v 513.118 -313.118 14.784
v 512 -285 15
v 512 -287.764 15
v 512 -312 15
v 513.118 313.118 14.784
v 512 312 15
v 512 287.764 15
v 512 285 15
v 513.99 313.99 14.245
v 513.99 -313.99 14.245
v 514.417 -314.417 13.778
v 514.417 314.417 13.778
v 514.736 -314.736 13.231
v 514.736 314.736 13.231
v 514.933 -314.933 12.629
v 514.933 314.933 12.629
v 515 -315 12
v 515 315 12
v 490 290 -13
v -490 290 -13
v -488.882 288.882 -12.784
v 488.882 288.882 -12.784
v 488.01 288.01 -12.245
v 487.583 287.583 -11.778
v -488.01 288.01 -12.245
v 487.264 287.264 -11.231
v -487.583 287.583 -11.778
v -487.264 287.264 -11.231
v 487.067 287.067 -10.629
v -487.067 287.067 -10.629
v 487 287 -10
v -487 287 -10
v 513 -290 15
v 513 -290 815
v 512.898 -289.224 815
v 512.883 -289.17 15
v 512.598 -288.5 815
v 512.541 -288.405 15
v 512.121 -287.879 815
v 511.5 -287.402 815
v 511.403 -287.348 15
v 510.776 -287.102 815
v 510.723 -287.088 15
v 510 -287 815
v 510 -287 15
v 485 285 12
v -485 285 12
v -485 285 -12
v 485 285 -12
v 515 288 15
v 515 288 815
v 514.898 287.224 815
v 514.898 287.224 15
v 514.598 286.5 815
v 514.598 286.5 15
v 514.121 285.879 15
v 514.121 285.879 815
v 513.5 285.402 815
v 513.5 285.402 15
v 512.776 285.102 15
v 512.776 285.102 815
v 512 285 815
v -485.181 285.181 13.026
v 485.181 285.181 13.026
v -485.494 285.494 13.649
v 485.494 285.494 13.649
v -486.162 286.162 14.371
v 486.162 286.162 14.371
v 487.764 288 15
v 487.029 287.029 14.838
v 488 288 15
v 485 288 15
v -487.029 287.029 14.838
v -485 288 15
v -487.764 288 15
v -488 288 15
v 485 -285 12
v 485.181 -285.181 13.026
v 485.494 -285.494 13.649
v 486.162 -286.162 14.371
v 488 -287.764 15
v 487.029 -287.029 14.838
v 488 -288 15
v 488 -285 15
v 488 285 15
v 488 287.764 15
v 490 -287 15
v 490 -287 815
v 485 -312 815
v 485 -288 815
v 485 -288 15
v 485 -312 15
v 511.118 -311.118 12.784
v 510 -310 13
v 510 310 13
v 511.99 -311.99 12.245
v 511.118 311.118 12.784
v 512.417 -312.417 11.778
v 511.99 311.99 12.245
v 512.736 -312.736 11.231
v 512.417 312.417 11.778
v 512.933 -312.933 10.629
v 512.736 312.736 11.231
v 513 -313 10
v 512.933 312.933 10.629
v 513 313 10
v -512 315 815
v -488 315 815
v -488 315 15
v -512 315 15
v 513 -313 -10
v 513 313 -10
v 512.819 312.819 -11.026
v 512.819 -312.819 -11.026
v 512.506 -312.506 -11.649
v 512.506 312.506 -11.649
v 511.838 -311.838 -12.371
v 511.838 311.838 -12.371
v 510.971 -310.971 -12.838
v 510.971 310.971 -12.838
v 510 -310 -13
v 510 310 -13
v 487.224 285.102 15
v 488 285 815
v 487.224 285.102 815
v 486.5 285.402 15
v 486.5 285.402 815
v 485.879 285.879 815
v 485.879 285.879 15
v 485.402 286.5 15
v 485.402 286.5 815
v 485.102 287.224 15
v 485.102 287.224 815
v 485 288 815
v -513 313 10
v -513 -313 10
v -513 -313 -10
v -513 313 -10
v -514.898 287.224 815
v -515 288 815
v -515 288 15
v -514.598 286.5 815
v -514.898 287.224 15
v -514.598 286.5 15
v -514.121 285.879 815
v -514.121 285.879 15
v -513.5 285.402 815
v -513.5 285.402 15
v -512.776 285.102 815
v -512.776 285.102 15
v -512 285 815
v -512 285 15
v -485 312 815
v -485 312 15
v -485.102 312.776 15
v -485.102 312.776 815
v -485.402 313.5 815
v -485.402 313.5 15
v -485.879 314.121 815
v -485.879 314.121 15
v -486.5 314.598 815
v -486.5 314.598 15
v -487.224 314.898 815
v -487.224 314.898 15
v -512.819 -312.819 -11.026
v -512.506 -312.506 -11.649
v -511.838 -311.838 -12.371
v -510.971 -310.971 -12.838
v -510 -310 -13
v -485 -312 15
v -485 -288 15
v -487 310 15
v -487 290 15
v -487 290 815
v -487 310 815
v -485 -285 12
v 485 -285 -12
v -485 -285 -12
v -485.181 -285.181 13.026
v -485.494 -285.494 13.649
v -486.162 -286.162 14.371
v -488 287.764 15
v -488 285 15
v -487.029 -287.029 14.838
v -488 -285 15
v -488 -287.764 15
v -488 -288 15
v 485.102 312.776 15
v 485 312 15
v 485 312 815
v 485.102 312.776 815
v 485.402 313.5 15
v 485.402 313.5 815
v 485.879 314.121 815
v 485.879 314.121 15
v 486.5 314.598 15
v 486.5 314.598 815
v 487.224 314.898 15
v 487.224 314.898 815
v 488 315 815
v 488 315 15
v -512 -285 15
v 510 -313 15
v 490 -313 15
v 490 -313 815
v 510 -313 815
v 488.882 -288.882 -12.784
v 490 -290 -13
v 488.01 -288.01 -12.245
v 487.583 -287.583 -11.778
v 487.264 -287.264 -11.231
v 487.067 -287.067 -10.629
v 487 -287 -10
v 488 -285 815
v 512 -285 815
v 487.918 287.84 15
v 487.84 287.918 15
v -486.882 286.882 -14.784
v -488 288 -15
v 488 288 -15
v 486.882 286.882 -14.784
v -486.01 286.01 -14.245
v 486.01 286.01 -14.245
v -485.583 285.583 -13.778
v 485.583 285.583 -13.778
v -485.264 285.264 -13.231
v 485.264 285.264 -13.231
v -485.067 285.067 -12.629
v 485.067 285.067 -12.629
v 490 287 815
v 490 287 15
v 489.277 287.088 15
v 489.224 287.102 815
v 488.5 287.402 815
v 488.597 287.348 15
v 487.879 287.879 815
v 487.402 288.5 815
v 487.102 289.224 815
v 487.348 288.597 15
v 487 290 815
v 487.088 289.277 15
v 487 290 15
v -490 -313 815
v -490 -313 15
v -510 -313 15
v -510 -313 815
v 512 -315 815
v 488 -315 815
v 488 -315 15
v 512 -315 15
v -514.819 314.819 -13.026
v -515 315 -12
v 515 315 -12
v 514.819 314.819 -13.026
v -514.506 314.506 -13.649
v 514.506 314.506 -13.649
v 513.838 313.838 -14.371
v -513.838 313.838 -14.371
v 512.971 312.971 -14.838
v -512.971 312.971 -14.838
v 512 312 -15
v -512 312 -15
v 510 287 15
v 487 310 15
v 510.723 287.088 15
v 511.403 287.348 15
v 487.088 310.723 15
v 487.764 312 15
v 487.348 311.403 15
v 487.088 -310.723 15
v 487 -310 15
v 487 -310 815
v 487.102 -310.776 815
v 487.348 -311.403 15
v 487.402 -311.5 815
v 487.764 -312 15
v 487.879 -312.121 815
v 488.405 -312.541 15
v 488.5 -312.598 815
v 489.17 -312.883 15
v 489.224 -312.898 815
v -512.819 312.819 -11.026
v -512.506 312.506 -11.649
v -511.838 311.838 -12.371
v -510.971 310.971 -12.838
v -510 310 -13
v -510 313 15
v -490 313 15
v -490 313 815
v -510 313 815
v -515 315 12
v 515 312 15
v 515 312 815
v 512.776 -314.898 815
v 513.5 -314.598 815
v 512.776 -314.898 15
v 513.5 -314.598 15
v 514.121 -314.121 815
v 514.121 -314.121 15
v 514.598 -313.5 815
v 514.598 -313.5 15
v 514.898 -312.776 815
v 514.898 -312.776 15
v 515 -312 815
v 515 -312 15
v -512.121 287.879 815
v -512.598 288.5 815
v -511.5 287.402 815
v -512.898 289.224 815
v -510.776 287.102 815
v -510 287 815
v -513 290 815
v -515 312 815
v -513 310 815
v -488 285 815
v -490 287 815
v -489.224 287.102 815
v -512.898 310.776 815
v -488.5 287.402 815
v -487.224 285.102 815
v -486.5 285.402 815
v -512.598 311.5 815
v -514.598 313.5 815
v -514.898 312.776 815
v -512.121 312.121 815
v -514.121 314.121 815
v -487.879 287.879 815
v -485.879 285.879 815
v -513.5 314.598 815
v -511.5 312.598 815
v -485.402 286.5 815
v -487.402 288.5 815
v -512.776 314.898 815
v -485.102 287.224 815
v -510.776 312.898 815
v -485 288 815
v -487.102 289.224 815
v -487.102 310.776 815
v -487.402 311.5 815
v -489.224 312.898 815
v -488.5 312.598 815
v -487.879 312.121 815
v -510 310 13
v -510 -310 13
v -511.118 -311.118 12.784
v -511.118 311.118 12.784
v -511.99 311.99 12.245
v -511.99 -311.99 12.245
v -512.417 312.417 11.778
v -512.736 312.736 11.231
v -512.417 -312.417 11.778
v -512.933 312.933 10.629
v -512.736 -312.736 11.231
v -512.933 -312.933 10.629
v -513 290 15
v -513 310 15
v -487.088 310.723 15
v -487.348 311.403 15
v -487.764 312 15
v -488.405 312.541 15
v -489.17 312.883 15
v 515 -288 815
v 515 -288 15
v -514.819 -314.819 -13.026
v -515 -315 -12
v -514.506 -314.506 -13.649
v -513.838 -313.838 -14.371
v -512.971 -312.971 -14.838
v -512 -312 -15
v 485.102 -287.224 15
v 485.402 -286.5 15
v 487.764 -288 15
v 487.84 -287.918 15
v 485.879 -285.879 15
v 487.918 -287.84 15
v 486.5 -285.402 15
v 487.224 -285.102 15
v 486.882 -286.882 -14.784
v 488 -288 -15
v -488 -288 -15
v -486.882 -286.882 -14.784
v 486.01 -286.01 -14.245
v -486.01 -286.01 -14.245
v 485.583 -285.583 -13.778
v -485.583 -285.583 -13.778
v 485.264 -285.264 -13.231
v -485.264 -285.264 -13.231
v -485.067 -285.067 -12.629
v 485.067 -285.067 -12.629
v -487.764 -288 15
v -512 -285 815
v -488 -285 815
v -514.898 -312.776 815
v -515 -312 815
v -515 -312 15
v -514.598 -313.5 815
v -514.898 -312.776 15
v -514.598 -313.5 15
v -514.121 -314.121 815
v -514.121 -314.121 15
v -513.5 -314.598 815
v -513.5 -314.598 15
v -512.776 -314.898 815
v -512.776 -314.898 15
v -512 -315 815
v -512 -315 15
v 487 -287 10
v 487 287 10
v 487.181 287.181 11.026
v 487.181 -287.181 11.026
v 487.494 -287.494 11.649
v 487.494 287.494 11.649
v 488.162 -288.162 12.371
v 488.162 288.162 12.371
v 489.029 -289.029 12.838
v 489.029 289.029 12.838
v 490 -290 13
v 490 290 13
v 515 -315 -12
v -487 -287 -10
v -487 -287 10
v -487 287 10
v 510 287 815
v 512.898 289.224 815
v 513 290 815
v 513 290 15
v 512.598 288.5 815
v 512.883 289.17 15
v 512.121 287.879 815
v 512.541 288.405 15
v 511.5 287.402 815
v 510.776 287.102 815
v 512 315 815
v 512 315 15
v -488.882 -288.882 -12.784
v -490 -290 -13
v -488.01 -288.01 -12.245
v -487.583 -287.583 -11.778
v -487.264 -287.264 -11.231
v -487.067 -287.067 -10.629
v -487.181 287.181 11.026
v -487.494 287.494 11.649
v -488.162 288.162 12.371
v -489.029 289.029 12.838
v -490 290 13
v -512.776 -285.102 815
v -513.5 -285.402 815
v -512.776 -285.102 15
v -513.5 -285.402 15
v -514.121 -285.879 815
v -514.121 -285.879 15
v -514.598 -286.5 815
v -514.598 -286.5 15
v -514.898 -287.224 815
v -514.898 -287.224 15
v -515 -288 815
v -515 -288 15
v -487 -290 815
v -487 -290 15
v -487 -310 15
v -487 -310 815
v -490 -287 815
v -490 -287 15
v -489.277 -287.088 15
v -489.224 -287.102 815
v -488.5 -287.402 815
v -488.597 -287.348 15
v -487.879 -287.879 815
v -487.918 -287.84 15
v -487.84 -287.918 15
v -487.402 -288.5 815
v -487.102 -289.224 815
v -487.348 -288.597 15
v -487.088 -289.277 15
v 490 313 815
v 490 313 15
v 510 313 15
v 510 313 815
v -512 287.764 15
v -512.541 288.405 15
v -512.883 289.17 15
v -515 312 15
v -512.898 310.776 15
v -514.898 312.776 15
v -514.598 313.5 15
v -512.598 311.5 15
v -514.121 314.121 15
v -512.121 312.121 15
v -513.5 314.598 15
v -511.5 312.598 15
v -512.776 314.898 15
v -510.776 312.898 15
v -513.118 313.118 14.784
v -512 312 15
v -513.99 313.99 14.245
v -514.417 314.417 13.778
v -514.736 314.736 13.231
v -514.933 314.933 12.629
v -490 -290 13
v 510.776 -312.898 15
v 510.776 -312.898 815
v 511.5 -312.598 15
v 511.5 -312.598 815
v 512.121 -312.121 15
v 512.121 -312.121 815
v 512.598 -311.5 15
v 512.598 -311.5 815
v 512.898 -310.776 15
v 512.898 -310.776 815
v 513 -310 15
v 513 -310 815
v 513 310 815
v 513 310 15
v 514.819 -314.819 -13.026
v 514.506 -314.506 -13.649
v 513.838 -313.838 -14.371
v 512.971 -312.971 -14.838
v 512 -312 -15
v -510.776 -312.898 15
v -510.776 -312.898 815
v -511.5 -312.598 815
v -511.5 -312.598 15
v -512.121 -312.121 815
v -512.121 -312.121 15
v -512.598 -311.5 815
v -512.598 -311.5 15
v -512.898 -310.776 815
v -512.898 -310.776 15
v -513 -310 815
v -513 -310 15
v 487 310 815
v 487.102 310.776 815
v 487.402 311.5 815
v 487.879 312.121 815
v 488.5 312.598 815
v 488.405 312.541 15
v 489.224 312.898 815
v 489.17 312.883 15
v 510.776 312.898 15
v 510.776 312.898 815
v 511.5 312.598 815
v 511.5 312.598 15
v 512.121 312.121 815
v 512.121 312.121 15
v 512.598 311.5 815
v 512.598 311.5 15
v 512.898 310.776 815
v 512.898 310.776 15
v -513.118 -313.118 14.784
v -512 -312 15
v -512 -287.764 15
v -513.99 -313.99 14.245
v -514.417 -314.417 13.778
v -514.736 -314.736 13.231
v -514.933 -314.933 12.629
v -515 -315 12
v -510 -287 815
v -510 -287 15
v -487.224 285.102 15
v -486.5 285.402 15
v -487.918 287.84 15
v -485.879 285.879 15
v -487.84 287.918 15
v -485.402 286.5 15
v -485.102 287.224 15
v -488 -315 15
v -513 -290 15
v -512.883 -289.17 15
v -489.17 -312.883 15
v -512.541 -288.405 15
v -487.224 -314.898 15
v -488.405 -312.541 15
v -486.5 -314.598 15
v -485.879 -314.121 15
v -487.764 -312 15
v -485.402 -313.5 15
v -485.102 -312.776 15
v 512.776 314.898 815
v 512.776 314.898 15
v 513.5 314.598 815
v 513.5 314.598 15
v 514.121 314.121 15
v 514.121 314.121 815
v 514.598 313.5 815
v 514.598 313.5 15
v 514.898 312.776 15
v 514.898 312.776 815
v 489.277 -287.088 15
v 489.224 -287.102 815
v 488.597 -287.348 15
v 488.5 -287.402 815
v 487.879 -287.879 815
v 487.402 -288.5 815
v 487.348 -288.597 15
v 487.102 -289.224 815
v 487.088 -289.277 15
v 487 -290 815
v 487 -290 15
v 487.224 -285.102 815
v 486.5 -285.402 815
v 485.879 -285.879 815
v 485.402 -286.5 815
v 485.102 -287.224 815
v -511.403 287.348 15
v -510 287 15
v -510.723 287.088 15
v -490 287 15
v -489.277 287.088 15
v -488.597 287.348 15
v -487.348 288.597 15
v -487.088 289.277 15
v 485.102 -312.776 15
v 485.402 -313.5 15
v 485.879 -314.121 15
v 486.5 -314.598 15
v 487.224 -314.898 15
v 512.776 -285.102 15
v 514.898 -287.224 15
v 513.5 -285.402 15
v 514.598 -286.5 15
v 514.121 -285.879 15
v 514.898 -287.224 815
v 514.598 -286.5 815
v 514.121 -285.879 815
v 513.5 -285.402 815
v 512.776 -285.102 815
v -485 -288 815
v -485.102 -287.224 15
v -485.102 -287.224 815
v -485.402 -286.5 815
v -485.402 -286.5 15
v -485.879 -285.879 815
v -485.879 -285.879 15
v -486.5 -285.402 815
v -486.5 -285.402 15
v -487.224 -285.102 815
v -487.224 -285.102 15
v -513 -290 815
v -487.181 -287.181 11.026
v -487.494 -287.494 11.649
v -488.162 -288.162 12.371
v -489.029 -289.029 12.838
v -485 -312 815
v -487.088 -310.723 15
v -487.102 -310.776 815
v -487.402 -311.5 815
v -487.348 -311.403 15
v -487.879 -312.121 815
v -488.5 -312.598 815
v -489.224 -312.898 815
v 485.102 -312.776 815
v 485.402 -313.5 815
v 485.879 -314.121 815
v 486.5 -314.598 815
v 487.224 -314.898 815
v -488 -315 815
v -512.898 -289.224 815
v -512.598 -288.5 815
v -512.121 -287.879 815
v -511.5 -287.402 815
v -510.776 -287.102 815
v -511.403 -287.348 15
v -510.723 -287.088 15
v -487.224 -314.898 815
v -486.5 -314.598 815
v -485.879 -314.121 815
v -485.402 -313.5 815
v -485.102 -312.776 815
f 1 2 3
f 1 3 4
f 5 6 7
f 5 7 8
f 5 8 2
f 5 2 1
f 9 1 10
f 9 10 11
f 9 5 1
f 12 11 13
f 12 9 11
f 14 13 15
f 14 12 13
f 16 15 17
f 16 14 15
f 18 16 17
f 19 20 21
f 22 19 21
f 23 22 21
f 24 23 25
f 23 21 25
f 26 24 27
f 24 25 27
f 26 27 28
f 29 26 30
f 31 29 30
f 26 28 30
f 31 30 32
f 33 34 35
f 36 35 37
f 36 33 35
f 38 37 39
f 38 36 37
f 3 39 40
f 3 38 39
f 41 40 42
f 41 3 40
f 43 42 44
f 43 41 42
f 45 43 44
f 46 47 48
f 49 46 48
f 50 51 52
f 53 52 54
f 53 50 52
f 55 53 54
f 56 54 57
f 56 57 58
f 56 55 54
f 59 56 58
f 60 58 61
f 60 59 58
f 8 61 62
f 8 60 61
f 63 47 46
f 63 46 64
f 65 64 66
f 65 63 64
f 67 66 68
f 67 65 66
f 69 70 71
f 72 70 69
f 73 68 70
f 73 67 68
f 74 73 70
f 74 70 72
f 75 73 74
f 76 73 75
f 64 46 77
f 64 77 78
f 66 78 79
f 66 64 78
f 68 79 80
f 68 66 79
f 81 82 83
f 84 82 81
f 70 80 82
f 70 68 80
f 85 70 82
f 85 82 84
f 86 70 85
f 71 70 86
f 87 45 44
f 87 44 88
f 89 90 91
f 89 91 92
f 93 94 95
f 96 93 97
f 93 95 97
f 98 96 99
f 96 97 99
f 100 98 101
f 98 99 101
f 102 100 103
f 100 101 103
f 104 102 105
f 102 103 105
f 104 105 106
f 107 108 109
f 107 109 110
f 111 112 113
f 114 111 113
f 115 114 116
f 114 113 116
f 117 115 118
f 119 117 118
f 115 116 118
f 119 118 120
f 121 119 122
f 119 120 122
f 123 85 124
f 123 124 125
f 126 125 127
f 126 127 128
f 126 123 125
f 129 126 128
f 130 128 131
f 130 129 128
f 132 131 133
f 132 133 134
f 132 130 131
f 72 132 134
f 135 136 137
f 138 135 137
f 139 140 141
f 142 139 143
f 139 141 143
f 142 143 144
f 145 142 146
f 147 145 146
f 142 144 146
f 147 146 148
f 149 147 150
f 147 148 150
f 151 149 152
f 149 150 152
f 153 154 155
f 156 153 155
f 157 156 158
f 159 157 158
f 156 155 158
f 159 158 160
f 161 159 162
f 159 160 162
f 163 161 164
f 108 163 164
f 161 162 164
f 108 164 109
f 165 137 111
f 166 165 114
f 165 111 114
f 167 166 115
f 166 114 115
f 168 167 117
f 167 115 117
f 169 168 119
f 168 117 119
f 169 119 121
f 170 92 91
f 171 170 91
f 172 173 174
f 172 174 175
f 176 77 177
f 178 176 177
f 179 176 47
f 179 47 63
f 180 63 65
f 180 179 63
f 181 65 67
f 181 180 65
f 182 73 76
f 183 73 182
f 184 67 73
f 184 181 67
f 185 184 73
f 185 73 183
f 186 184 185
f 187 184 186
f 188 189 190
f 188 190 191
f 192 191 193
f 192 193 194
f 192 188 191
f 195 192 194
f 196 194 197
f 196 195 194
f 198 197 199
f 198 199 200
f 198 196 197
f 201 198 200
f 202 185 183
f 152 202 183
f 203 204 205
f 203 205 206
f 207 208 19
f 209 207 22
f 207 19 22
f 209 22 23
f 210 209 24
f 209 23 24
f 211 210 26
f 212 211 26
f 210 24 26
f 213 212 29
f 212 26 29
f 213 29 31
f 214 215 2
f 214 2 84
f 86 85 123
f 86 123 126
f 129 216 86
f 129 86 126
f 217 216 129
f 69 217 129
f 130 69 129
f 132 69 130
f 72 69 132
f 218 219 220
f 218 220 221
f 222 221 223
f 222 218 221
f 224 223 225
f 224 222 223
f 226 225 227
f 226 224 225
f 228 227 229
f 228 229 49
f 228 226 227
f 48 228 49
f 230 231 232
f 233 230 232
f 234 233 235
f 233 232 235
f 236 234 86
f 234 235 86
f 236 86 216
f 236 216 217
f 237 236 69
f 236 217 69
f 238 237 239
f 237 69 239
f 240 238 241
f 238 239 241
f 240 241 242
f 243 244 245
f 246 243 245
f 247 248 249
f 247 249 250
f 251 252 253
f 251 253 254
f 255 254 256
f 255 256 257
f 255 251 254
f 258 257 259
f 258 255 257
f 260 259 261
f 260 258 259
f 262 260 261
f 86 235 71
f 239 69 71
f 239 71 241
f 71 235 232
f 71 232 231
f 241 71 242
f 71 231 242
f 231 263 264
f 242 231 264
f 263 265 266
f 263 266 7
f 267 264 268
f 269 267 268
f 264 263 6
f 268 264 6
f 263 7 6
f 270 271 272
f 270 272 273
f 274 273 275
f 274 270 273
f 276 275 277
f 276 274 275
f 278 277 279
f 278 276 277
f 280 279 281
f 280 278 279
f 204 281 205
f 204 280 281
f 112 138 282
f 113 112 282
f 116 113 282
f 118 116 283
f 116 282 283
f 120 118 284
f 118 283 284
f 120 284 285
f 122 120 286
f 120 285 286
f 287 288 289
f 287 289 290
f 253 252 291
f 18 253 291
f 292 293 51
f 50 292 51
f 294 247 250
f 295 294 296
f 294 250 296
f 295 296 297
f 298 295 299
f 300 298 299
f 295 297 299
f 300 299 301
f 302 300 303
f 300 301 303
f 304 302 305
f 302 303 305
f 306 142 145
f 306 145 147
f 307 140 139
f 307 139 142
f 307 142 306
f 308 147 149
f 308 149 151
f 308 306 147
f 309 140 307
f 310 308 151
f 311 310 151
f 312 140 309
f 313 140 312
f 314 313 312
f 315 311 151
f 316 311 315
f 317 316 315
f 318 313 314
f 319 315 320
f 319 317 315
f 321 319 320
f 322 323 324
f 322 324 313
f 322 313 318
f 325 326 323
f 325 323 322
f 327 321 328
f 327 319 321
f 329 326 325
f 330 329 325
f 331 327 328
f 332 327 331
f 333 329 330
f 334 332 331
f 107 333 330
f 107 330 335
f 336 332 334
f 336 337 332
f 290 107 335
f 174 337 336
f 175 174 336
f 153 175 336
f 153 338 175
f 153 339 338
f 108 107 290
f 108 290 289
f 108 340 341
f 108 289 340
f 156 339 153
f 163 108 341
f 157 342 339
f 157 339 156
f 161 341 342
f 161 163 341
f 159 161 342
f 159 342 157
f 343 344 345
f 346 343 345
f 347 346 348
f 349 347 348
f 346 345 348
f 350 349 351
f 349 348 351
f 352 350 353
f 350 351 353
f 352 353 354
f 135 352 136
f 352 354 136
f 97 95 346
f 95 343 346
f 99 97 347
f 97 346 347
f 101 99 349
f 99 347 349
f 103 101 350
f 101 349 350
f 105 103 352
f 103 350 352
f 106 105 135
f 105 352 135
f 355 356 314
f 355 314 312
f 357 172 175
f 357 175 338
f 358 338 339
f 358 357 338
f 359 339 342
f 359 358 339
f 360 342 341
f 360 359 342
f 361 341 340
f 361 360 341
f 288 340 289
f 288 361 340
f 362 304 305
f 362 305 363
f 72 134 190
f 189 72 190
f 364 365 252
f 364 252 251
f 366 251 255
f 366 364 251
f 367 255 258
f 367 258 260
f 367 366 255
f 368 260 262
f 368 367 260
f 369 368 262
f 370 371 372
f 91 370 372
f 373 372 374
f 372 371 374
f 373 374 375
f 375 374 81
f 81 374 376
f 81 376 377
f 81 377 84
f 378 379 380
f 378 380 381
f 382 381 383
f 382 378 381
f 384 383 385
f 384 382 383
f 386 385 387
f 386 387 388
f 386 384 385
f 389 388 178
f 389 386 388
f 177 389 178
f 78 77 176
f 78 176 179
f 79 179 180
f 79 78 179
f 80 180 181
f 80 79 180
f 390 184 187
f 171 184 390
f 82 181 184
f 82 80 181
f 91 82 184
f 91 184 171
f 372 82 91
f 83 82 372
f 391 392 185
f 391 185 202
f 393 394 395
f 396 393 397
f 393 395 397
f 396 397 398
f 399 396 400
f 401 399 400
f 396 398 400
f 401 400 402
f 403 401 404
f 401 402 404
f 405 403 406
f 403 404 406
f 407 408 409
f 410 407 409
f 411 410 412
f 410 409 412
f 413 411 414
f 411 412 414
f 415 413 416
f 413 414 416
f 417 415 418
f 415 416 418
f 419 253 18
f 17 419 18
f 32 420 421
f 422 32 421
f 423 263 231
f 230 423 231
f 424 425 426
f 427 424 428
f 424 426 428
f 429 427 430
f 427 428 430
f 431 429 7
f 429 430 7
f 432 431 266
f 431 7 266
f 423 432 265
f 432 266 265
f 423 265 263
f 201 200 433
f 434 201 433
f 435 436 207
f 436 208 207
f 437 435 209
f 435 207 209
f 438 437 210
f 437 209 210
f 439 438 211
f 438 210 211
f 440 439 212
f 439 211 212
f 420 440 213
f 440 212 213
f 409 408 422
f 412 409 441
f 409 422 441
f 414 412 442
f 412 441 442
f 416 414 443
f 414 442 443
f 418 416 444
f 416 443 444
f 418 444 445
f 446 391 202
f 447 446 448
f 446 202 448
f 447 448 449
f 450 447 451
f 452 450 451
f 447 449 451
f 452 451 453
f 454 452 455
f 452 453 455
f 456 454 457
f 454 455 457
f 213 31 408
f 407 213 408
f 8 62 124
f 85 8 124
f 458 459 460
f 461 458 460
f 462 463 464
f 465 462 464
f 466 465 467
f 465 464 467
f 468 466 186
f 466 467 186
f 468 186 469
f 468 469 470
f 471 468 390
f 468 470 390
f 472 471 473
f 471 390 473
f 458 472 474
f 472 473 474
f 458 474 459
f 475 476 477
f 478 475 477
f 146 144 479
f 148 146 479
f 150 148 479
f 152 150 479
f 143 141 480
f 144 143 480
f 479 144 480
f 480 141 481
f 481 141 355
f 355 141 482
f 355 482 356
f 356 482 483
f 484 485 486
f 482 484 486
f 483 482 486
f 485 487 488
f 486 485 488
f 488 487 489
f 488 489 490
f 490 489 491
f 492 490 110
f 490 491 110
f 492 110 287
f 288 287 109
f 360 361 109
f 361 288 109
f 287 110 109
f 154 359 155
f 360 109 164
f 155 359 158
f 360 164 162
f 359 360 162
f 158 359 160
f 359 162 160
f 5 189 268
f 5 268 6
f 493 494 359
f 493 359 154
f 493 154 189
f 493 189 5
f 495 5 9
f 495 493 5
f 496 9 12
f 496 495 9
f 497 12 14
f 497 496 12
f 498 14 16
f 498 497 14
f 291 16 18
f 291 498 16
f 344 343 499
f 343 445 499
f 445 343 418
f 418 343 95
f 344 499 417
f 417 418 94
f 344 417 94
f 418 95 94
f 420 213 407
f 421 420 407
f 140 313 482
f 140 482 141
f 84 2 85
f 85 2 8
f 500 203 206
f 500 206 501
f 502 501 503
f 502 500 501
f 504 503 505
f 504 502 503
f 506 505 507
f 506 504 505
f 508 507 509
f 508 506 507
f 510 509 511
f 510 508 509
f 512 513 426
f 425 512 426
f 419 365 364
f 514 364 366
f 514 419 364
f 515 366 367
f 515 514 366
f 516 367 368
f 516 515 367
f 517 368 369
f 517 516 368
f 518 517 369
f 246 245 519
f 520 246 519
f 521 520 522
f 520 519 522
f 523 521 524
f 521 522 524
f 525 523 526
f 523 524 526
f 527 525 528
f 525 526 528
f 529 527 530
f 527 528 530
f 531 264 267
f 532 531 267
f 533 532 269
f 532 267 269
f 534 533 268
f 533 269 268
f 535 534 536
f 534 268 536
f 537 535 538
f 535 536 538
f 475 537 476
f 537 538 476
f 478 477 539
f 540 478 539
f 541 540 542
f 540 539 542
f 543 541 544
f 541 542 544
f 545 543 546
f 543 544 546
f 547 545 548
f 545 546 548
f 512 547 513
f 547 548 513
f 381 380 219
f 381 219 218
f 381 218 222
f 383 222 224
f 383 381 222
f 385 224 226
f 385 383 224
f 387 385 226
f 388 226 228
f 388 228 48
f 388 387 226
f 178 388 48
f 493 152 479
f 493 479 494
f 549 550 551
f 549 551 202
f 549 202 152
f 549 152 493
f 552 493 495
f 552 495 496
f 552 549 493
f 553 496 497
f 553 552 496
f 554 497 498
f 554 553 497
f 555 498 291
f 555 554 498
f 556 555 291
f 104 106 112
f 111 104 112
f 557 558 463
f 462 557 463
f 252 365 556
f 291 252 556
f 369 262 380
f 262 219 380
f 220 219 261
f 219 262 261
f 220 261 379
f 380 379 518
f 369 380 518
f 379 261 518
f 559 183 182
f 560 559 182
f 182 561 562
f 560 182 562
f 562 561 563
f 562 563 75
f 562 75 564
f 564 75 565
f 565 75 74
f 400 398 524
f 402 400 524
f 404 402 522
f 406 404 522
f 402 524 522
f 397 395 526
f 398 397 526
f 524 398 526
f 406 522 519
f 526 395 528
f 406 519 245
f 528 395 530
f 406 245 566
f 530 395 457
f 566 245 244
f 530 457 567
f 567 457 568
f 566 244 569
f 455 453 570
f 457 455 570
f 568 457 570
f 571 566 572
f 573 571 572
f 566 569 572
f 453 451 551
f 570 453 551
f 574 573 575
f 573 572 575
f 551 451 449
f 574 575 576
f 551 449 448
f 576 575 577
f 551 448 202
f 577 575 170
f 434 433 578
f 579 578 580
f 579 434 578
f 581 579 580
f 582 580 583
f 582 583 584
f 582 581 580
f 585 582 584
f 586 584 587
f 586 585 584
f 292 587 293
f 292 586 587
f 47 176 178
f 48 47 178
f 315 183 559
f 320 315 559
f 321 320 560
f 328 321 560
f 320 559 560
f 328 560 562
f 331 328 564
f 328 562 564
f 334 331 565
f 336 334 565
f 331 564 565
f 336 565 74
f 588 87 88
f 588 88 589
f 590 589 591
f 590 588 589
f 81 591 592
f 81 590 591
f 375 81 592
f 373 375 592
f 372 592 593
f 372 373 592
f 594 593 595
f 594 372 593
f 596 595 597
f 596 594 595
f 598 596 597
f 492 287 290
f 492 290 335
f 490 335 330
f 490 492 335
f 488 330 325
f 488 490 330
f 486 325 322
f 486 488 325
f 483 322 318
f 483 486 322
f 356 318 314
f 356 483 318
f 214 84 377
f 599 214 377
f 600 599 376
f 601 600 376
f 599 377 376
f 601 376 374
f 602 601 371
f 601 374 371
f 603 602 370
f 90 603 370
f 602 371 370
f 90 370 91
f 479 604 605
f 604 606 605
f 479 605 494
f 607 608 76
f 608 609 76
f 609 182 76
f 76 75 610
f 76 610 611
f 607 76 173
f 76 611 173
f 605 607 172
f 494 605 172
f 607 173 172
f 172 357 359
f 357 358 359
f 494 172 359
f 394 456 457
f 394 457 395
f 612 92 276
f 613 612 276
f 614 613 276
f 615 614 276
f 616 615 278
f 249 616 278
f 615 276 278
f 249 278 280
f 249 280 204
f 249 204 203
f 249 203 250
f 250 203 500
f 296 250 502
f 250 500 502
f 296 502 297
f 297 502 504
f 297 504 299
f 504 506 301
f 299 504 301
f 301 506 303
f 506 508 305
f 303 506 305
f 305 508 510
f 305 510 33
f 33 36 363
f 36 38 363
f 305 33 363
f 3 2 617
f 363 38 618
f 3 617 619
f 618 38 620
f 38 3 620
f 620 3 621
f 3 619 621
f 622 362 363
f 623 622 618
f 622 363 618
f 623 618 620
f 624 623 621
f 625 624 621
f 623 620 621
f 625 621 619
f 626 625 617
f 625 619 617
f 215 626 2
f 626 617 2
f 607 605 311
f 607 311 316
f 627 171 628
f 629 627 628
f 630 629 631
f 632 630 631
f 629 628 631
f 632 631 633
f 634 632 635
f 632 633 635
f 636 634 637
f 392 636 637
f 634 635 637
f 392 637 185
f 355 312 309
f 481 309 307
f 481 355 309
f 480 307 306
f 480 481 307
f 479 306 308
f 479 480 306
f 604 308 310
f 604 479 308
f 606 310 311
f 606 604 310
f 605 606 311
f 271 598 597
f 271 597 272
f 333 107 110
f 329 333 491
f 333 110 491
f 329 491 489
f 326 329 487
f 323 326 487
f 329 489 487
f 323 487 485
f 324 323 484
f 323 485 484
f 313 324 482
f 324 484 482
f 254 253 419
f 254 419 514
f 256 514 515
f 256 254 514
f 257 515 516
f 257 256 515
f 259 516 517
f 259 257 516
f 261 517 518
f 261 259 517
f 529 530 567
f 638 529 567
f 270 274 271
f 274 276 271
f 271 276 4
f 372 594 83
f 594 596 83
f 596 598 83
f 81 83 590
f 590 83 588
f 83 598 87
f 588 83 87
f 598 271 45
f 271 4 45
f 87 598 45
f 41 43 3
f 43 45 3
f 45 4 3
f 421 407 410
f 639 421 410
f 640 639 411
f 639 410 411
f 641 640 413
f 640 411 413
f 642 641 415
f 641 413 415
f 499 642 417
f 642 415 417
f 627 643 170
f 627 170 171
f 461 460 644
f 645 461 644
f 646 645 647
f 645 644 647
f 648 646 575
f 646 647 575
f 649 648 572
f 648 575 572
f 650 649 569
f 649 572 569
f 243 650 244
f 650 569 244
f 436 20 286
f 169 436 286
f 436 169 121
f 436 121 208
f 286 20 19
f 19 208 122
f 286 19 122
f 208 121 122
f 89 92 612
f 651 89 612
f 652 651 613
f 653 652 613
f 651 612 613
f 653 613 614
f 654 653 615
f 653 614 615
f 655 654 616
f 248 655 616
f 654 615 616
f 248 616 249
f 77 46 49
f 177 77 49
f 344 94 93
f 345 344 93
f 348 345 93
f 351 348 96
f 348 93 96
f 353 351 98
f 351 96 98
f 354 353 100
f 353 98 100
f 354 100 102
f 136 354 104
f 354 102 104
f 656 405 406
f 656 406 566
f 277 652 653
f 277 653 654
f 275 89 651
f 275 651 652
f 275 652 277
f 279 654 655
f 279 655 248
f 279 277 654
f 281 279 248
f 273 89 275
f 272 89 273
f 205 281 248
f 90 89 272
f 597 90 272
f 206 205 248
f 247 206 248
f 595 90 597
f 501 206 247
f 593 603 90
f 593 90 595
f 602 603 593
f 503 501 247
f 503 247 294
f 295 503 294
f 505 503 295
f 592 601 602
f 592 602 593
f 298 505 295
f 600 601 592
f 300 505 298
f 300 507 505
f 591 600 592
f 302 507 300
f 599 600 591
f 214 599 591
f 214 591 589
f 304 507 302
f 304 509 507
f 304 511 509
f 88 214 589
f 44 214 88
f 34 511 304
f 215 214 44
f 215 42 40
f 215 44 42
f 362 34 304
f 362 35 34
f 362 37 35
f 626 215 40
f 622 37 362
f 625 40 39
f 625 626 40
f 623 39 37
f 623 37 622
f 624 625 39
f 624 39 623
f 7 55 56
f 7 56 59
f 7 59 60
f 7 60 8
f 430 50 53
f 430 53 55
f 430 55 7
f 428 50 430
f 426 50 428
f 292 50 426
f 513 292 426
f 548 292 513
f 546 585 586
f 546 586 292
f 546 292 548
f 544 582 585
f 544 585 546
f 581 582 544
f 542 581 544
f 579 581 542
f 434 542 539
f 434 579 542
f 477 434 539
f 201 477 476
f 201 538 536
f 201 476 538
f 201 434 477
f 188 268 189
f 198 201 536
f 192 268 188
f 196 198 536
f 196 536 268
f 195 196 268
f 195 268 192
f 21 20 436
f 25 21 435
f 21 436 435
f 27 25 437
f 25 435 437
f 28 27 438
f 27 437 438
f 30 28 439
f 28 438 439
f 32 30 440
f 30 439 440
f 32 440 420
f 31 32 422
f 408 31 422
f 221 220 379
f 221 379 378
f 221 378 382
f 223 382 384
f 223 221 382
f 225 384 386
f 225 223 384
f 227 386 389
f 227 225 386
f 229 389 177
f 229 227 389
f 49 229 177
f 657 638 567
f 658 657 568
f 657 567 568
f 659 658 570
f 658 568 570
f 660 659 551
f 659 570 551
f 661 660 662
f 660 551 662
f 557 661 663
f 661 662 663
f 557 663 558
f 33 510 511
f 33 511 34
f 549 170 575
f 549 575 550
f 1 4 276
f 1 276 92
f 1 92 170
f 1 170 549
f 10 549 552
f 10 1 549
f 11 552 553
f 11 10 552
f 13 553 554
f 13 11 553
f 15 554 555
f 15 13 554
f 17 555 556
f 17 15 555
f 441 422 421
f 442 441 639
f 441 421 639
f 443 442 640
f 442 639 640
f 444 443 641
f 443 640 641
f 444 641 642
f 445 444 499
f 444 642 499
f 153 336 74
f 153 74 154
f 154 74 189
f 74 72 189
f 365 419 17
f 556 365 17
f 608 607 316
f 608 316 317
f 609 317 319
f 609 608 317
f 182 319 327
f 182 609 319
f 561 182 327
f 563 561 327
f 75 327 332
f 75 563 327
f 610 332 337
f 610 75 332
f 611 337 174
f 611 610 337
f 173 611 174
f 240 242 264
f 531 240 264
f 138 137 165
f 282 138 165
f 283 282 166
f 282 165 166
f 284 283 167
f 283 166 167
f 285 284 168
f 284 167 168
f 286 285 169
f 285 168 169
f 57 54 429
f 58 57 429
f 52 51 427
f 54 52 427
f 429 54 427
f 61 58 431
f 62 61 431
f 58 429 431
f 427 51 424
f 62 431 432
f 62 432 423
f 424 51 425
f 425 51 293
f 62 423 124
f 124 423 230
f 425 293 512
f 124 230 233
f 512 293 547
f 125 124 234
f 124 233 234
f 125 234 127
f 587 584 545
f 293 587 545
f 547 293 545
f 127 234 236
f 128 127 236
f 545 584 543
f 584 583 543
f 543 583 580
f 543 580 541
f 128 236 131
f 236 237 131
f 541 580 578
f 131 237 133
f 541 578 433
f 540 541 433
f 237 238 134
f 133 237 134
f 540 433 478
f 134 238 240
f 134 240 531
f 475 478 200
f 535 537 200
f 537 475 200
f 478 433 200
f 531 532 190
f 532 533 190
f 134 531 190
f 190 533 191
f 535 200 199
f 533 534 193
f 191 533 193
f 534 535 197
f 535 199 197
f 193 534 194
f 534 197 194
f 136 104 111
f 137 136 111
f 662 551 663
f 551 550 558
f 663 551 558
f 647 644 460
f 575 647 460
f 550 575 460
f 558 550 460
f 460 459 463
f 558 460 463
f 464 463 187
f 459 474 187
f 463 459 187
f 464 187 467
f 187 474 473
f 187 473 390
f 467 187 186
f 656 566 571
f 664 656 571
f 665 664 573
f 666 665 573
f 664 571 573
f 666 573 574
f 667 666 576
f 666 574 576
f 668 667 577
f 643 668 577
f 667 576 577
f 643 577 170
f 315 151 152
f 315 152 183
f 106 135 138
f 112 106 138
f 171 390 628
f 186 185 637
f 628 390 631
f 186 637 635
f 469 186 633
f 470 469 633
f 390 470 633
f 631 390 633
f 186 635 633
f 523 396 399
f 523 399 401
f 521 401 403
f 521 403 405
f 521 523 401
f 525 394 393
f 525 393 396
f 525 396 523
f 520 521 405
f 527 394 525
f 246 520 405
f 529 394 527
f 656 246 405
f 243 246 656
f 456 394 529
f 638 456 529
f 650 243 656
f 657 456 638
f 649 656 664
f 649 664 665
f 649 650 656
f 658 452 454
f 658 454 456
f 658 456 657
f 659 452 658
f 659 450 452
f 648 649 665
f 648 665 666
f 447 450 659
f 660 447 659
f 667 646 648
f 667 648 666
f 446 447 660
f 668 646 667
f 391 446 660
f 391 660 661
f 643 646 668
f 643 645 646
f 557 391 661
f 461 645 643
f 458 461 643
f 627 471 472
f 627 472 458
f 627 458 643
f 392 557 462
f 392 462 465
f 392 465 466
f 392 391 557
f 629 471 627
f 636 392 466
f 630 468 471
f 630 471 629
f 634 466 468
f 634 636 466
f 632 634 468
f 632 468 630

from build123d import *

# Parameters (mm, degrees)
BOSS_EXTRU_1_DEPTH = 800


with BuildPart() as part:
    # Balayage1: sweep along a path in Esquisse1
    with BuildLine(Plane.XY) as balayage1_path:
        Line((-600, -400), (600, -400))
        Line((600, -400), (600, 400))
        Line((600, 400), (-600, 400))
        Line((-600, 400), (-600, -400))
    # Esquisse2 → Balayage1 (sweep)
    with BuildSketch(Plane(origin=(0, 0, 0), x_dir=(1, 0, 0), z_dir=(0, 1, 0))):
        with BuildLine():
            Line((-512, -15), (-488, -15))
            ThreePointArc((-488, -15), (-485.878679656, -14.121320344), (-485, -12))
            Line((-485, -12), (-485, 12))
            ThreePointArc((-485, 12), (-485.878679656, 14.121320344), (-488, 15))
            Line((-488, 15), (-512, 15))
            ThreePointArc((-512, 15), (-514.121320344, 14.121320344), (-515, 12))
            Line((-515, 12), (-515, -12))
            ThreePointArc((-515, -12), (-514.121320344, -14.121320344), (-512, -15))
        make_face()
        with BuildLine():
            Line((-510, -13), (-490, -13))
            ThreePointArc((-490, -13), (-487.878679656, -12.121320344), (-487, -10))
            Line((-487, -10), (-487, 10))
            ThreePointArc((-487, 10), (-487.878679656, 12.121320344), (-490, 13))
            Line((-490, 13), (-510, 13))
            ThreePointArc((-510, 13), (-512.121320344, 12.121320344), (-513, 10))
            Line((-513, 10), (-513, -10))
            ThreePointArc((-513, -10), (-512.121320344, -12.121320344), (-510, -13))
        make_face(mode=Mode.SUBTRACT)
    sweep(path=balayage1_path.line, transition=Transition.RIGHT)

    # Esquisse3 → Boss.-Extru.1 (add)
    # profile 1 of 4: a face of its own
    with BuildSketch(Plane.XY.offset(15)):
        with BuildLine():
            Line((-512, 285), (-488, 285))
            ThreePointArc((-488, 285), (-485.878679656, 285.878679656), (-485, 288))
            Line((-485, 288), (-485, 312))
            ThreePointArc((-485, 312), (-485.878679656, 314.121320344), (-488, 315))
            Line((-488, 315), (-512, 315))
            ThreePointArc((-512, 315), (-514.121320344, 314.121320344), (-515, 312))
            Line((-515, 312), (-515, 288))
            ThreePointArc((-515, 288), (-514.121320344, 285.878679656), (-512, 285))
        make_face()
        with BuildLine():
            Line((-510, 287), (-490, 287))
            ThreePointArc((-490, 287), (-487.878679656, 287.878679656), (-487, 290))
            Line((-487, 290), (-487, 310))
            ThreePointArc((-487, 310), (-487.878679656, 312.121320344), (-490, 313))
            Line((-490, 313), (-510, 313))
            ThreePointArc((-510, 313), (-512.121320344, 312.121320344), (-513, 310))
            Line((-513, 310), (-513, 290))
            ThreePointArc((-513, 290), (-512.121320344, 287.878679656), (-510, 287))
        make_face(mode=Mode.SUBTRACT)
    # profile 2 of 4: a face of its own
    with BuildSketch(Plane.XY.offset(15)):
        with BuildLine():
            Line((485, 288), (485, 312))
            ThreePointArc((485, 312), (485.878679656, 314.121320344), (488, 315))
            Line((488, 315), (512, 315))
            ThreePointArc((512, 315), (514.121320344, 314.121320344), (515, 312))
            Line((515, 312), (515, 288))
            ThreePointArc((515, 288), (514.121320344, 285.878679656), (512, 285))
            Line((512, 285), (488, 285))
            ThreePointArc((488, 285), (485.878679656, 285.878679656), (485, 288))
        make_face()
        with BuildLine():
            Line((487, 290), (487, 310))
            ThreePointArc((487, 310), (487.878679656, 312.121320344), (490, 313))
            Line((490, 313), (510, 313))
            ThreePointArc((510, 313), (512.121320344, 312.121320344), (513, 310))
            Line((513, 310), (513, 290))
            ThreePointArc((513, 290), (512.121320344, 287.878679656), (510, 287))
            Line((510, 287), (490, 287))
            ThreePointArc((490, 287), (487.878679656, 287.878679656), (487, 290))
        make_face(mode=Mode.SUBTRACT)
    # profile 3 of 4: a face of its own
    with BuildSketch(Plane.XY.offset(15)):
        with BuildLine():
            Line((-512, -315), (-488, -315))
            ThreePointArc((-488, -315), (-485.878679656, -314.121320344), (-485, -312))
            Line((-485, -312), (-485, -288))
            ThreePointArc((-485, -288), (-485.878679656, -285.878679656), (-488, -285))
            Line((-488, -285), (-512, -285))
            ThreePointArc((-512, -285), (-514.121320344, -285.878679656), (-515, -288))
            Line((-515, -288), (-515, -312))
            ThreePointArc((-515, -312), (-514.121320344, -314.121320344), (-512, -315))
        make_face()
        with BuildLine():
            Line((-510, -287), (-490, -287))
            ThreePointArc((-490, -287), (-487.878679656, -287.878679656), (-487, -290))
            Line((-487, -290), (-487, -310))
            ThreePointArc((-487, -310), (-487.878679656, -312.121320344), (-490, -313))
            Line((-490, -313), (-510, -313))
            ThreePointArc((-510, -313), (-512.121320344, -312.121320344), (-513, -310))
            Line((-513, -310), (-513, -290))
            ThreePointArc((-513, -290), (-512.121320344, -287.878679656), (-510, -287))
        make_face(mode=Mode.SUBTRACT)
    # profile 4 of 4: a face of its own
    with BuildSketch(Plane.XY.offset(15)):
        with BuildLine():
            Line((512, -285), (488, -285))
            ThreePointArc((488, -285), (485.878679656, -285.878679656), (485, -288))
            Line((485, -288), (485, -312))
            ThreePointArc((485, -312), (485.878679656, -314.121320344), (488, -315))
            Line((488, -315), (512, -315))
            ThreePointArc((512, -315), (514.121320344, -314.121320344), (515, -312))
            Line((515, -312), (515, -288))
            ThreePointArc((515, -288), (514.121320344, -285.878679656), (512, -285))
        make_face()
        with BuildLine():
            Line((510, -287), (490, -287))
            ThreePointArc((490, -287), (487.878679656, -287.878679656), (487, -290))
            Line((487, -290), (487, -310))
            ThreePointArc((487, -310), (487.878679656, -312.121320344), (490, -313))
            Line((490, -313), (510, -313))
            ThreePointArc((510, -313), (512.121320344, -312.121320344), (513, -310))
            Line((513, -310), (513, -290))
            ThreePointArc((513, -290), (512.121320344, -287.878679656), (510, -287))
        make_face(mode=Mode.SUBTRACT)
    extrude(amount=BOSS_EXTRU_1_DEPTH)


solid = part.part
